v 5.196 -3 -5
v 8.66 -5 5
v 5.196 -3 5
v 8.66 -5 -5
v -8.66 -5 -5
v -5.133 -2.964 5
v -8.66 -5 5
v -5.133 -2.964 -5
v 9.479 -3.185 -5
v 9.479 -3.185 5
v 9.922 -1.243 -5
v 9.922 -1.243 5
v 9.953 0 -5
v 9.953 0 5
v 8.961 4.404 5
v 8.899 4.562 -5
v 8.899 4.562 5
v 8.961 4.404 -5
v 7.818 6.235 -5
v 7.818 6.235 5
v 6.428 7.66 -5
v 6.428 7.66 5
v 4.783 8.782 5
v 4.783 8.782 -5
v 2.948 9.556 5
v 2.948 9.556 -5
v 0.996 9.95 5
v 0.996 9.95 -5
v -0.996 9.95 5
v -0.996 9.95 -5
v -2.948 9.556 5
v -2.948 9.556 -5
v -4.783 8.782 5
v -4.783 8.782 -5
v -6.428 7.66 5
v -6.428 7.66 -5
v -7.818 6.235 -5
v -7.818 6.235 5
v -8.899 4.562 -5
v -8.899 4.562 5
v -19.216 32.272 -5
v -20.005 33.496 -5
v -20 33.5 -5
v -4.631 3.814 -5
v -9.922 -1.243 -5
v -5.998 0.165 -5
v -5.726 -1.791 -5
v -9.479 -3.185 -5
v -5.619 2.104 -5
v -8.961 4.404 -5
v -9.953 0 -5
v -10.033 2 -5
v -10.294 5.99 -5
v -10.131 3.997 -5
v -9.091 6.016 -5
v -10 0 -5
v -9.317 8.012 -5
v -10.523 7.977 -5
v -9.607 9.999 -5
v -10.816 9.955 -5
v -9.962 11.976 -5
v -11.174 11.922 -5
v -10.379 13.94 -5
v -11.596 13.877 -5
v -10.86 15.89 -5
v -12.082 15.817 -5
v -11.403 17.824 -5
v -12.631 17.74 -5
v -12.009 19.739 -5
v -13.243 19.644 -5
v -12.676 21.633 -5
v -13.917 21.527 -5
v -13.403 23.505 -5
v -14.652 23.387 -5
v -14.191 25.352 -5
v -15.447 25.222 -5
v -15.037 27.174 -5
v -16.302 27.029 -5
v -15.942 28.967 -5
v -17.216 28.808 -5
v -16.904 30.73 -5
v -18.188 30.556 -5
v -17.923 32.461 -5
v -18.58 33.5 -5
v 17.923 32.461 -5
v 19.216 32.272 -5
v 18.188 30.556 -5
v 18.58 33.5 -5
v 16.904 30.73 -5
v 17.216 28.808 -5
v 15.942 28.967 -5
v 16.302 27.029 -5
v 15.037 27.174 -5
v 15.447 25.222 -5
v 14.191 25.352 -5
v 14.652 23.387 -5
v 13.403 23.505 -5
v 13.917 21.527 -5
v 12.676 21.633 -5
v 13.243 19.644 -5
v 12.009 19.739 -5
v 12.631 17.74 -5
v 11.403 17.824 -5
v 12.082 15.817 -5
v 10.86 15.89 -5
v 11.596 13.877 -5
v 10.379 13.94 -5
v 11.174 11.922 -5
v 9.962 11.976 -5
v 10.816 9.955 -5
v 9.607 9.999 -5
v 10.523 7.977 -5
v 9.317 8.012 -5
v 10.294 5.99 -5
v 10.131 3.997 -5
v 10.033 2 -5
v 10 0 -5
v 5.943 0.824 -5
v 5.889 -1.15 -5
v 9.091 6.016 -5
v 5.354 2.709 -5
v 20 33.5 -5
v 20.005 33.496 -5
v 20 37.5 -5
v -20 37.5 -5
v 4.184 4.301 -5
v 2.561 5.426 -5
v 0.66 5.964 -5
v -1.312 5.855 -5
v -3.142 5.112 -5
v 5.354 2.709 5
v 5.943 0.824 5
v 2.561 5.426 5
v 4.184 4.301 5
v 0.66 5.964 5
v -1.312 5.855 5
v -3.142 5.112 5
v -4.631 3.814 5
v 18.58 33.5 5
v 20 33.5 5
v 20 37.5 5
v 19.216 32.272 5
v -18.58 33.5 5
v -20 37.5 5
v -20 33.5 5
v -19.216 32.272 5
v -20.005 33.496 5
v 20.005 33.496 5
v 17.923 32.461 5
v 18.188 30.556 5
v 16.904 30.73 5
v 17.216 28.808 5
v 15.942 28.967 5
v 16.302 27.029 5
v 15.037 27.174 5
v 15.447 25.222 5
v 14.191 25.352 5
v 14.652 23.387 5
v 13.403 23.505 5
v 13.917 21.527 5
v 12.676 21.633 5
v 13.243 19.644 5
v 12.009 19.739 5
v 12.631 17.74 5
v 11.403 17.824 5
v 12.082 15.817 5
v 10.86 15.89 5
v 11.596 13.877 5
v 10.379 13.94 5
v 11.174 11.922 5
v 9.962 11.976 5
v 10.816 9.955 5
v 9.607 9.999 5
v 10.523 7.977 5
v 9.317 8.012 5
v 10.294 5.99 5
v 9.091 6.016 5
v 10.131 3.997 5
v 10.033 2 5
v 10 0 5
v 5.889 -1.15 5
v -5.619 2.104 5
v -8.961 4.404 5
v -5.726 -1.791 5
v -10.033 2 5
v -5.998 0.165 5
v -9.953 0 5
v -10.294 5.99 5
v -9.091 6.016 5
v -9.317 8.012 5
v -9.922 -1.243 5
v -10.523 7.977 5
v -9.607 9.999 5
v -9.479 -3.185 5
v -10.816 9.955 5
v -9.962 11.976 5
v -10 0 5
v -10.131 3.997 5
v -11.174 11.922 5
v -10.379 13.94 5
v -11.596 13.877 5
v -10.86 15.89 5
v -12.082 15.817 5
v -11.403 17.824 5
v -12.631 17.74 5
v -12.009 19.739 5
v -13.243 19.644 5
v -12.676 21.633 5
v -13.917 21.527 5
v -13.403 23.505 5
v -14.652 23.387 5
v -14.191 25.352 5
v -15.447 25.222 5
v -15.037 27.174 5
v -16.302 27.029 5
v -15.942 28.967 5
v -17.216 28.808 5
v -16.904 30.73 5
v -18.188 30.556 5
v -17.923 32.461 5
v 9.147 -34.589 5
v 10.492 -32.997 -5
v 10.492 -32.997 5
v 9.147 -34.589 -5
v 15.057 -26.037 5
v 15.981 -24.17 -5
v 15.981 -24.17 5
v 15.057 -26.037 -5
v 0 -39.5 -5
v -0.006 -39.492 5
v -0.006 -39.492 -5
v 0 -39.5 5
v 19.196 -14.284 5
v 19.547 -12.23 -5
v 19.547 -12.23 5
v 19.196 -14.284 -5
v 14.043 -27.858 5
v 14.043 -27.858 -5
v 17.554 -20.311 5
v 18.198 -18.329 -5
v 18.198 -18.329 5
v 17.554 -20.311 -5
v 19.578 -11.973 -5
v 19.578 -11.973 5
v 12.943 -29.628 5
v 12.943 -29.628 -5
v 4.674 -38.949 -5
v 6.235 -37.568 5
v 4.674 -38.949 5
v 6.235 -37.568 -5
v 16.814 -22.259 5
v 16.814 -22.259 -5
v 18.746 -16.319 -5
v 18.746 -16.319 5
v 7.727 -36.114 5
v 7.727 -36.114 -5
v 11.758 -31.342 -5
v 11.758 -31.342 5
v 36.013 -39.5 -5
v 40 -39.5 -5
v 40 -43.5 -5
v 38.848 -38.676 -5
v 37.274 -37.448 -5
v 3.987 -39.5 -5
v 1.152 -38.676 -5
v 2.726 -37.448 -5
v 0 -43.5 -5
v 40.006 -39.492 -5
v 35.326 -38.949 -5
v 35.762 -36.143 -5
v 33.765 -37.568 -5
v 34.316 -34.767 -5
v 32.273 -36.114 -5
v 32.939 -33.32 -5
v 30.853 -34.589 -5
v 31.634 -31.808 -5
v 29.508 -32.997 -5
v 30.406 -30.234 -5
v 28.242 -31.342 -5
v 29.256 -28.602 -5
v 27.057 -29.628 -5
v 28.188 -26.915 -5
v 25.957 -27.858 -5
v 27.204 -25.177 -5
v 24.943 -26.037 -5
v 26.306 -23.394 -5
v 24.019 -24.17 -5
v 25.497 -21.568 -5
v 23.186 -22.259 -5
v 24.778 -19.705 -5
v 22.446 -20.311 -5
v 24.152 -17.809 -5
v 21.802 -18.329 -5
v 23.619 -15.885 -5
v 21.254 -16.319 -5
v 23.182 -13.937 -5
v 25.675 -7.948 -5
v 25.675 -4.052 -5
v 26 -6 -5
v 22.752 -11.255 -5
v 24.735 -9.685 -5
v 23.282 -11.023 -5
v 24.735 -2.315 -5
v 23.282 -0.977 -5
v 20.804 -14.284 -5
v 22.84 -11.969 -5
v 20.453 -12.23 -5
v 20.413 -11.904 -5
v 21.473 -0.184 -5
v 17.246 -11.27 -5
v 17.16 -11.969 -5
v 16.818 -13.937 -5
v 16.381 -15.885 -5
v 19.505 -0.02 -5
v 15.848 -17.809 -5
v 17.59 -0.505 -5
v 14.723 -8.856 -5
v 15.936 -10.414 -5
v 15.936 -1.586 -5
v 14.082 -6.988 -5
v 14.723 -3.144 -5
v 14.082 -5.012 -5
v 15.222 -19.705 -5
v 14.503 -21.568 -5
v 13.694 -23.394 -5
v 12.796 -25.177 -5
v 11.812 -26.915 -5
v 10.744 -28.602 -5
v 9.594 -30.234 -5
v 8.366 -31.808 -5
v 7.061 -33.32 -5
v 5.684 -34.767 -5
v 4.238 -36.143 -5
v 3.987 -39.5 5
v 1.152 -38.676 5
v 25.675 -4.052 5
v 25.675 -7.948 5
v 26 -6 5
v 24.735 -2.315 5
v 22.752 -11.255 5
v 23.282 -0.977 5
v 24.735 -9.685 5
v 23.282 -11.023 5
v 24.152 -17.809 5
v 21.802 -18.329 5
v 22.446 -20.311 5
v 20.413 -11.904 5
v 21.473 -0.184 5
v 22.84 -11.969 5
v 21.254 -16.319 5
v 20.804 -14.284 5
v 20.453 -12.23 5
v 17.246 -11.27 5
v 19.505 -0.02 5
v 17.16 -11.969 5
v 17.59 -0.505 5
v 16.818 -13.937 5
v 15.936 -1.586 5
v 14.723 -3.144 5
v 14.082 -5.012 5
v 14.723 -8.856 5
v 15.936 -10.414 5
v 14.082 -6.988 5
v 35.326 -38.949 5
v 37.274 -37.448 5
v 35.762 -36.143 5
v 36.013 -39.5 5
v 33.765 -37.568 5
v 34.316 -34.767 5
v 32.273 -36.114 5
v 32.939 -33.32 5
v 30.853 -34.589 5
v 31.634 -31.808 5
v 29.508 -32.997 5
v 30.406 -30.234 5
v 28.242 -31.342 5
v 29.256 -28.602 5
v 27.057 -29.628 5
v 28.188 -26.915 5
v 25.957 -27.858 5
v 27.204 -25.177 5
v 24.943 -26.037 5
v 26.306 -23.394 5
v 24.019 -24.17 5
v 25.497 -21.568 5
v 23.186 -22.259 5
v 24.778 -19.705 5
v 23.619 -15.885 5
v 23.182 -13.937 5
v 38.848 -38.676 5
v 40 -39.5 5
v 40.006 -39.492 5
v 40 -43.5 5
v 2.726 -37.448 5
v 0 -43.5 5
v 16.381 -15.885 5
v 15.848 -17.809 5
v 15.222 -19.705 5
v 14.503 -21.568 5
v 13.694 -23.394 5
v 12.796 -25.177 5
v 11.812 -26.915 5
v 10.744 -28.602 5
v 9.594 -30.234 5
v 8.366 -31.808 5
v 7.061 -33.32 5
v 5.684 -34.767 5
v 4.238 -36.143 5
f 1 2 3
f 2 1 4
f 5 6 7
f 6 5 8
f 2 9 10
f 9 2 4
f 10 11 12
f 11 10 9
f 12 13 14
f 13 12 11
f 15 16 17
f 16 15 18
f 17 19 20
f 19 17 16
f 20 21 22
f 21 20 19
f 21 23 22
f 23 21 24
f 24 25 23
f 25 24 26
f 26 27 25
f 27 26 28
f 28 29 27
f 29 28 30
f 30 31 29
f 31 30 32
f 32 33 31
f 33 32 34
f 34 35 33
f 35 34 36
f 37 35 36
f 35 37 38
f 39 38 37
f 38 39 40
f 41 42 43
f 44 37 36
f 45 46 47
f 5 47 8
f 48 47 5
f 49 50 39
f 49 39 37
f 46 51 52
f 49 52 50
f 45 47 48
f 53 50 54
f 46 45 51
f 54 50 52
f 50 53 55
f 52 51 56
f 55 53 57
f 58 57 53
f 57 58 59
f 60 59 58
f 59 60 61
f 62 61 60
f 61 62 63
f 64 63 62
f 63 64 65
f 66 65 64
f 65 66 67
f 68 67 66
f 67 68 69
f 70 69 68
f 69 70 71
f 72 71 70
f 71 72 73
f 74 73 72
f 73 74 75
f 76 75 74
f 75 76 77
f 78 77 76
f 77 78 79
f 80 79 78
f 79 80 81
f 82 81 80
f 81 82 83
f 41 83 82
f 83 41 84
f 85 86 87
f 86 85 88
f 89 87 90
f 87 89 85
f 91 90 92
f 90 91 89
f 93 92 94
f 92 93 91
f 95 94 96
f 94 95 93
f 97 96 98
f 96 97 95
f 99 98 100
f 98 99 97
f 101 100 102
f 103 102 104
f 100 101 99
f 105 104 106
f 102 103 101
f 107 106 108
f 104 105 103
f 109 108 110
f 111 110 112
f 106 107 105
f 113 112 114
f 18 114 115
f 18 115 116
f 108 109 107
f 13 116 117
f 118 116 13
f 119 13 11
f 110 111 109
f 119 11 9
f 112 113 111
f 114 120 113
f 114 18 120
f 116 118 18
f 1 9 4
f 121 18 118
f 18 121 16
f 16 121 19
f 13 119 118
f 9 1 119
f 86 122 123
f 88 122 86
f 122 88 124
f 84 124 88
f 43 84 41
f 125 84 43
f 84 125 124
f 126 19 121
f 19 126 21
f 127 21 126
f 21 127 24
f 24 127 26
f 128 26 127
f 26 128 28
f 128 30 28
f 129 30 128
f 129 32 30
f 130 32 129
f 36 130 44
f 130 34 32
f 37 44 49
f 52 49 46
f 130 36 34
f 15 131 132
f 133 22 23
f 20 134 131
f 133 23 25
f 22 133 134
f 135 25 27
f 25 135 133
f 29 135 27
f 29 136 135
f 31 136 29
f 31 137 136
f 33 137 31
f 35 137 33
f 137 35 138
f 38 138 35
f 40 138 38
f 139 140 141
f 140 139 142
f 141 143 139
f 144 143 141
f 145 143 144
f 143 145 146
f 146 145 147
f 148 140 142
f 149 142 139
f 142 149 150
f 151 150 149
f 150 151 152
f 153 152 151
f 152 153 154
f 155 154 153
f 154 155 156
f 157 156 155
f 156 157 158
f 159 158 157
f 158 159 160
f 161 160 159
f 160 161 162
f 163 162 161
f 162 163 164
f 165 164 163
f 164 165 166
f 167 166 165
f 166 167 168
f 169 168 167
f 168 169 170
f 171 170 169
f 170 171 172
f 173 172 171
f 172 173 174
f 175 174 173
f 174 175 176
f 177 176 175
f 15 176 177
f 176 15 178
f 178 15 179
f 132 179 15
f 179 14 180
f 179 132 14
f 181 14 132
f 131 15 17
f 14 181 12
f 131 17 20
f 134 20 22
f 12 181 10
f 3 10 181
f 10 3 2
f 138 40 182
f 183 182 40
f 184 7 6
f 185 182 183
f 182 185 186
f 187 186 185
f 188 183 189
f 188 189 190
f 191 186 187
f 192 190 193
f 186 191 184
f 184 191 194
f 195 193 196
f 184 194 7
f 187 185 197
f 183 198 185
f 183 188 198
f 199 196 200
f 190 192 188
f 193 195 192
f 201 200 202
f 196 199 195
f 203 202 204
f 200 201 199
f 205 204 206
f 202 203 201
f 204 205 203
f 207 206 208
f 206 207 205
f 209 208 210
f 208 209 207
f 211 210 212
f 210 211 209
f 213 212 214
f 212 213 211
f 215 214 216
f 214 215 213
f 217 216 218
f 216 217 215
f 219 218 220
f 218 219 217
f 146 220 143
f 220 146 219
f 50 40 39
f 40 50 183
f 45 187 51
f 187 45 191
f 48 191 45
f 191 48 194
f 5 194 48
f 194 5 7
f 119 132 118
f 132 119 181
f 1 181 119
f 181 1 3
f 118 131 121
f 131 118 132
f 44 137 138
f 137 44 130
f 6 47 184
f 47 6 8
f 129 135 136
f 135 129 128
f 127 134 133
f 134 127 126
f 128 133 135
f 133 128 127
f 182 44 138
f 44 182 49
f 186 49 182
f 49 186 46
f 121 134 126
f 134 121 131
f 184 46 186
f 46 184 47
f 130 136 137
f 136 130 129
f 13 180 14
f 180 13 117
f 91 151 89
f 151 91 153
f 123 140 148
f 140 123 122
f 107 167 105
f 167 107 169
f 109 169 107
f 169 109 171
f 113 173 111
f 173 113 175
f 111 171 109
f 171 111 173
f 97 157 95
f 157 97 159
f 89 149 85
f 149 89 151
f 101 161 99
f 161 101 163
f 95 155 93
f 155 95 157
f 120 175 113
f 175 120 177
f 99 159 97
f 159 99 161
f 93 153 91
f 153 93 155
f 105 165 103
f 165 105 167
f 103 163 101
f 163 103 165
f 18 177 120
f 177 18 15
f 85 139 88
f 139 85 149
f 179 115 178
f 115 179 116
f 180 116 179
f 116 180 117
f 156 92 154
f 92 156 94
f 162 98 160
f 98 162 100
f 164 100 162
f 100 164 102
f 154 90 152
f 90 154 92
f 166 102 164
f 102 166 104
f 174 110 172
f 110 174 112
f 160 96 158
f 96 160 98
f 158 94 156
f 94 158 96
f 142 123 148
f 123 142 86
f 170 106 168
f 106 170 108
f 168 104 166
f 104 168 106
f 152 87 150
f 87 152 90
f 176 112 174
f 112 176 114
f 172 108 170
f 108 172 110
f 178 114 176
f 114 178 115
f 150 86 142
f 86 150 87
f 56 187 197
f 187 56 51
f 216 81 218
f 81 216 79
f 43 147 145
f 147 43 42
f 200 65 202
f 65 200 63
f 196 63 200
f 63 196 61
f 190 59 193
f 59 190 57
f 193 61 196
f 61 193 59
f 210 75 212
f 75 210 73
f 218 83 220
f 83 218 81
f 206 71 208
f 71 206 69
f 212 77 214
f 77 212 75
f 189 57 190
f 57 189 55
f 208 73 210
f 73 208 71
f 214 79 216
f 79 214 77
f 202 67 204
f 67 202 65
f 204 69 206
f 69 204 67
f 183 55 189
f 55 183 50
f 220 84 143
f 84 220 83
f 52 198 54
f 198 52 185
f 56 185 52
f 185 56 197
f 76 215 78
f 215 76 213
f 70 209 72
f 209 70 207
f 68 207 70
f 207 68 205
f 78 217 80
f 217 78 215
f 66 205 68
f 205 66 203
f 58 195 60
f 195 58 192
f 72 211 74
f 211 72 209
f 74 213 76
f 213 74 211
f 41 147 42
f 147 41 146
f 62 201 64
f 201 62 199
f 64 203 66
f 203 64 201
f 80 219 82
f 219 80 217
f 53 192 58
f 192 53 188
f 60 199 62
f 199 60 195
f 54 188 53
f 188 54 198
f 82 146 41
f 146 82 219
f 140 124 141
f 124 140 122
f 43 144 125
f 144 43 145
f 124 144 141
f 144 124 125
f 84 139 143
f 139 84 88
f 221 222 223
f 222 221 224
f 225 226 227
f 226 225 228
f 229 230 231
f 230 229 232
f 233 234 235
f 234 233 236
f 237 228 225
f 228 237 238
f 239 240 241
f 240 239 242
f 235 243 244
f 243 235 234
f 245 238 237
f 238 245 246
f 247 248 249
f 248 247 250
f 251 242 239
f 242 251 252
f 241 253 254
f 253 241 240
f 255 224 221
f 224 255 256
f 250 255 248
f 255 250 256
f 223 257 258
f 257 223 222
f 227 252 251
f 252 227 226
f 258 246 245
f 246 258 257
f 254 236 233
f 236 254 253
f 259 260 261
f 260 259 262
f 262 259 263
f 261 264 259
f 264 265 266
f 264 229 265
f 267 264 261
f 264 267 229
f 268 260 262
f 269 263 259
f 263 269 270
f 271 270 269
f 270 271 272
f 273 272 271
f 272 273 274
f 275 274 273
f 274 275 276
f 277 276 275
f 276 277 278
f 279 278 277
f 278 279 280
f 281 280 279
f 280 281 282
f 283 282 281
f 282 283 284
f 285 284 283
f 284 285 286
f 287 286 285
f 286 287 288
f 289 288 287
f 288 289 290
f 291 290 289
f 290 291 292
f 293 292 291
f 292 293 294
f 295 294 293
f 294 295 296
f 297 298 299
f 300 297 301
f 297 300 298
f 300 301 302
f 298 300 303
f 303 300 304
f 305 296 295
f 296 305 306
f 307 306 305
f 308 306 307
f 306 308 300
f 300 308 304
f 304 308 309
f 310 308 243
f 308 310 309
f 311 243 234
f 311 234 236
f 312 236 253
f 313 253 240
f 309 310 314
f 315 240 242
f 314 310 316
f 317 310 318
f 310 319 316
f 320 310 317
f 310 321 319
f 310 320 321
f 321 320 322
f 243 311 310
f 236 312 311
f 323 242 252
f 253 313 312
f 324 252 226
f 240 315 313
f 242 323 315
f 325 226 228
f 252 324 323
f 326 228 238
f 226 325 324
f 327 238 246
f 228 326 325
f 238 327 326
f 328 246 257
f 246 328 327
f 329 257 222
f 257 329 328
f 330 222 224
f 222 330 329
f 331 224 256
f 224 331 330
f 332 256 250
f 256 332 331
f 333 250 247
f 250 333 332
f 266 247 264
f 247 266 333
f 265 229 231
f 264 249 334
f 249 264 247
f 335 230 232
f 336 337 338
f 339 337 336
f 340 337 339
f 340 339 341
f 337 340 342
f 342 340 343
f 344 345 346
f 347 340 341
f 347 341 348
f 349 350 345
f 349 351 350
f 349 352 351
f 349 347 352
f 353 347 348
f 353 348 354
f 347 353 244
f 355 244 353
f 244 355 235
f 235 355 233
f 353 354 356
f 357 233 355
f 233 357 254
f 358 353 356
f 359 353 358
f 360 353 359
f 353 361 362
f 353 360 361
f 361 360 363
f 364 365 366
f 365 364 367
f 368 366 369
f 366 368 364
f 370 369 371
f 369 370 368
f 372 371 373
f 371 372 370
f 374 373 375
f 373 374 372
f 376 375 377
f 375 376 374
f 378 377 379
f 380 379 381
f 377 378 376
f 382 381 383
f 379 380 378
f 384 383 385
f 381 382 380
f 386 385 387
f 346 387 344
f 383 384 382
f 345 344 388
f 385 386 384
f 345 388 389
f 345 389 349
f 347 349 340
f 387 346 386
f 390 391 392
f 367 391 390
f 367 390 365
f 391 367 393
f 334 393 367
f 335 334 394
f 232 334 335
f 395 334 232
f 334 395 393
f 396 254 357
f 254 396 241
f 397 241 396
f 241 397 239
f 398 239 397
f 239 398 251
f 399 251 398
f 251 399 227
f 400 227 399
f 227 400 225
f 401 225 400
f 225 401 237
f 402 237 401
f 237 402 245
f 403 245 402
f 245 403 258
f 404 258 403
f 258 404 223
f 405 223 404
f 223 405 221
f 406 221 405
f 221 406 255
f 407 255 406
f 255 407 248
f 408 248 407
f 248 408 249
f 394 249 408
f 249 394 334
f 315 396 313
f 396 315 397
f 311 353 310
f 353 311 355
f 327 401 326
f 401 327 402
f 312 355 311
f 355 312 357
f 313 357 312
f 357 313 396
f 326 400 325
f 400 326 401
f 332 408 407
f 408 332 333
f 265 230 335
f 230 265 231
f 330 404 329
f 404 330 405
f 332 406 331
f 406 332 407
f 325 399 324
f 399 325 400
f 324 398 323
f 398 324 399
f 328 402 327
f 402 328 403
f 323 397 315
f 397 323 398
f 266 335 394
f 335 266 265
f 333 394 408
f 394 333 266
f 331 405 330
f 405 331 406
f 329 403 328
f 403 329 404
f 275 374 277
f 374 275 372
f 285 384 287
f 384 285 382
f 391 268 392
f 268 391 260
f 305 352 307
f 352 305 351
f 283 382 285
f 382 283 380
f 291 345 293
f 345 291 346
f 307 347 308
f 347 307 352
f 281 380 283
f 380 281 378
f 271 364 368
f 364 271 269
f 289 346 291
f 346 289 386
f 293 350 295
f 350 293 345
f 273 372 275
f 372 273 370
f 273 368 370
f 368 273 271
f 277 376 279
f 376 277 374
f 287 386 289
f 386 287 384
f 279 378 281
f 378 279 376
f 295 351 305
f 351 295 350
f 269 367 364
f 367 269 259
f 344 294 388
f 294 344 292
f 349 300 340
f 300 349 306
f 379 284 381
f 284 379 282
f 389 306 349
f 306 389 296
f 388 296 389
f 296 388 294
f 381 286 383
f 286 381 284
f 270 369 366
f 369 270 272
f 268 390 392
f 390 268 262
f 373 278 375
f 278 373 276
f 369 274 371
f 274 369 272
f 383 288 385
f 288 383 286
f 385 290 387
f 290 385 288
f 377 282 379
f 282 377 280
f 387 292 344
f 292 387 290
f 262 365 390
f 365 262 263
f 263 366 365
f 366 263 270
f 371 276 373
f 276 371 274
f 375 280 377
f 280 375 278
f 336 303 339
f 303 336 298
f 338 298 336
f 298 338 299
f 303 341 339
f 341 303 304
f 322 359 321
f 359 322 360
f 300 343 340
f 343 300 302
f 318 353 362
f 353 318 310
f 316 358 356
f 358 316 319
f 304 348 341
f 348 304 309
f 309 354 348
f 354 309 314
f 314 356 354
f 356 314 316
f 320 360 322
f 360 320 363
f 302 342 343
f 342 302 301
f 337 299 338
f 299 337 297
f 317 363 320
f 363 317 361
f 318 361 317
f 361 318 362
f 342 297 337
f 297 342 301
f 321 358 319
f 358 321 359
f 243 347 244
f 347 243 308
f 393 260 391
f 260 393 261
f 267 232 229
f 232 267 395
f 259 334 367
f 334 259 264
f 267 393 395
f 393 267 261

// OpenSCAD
/* [General] */
//radius of the center cylinder that gets captured
circle_rad = 6;
//outer radius of the grabber
outer_rad = 10;
//how high to "extrude" evertyhing
height = 10;
//Desired total length of both parts when captured
total_len = 75;


/* [Grabber portion] */
//Base width
grabber_base_w = 40;
//Base depth (thickness)
grabber_base_d = 4;
//Arms depth (thickness)
grabber_arm_d = 1.2;
//Set the length of the grabber (circle center to end of base) instead of assuming half of total_len
grabber_len_override = -1;
grabber_arm_len = (grabber_len_override>0) ? grabber_len_override : total_len/2 - grabber_base_d;
//Radial gap between captured cylinder and grabber; 0 is probably best for most cases
grabber_gap = 0.0; //[0:0.1:5]
//Angle (degrees) of the open gap in the grabber that accepts the captured cylinder; smaller is tighter
grabber_open_angle = 120;


/* [Captured portion] */
//Base width
captured_base_w = 40;
//Base depth (thickness)
captured_base_d = 4;
//Arms depth (thickness)
captured_arm_d = 2.4;
//Set the length of the captured part (cylinder center to end of base) instead of assuming half of total_len
captured_len_override = -1;
captured_arm_len = (captured_len_override>0) ? captured_len_override : total_len/2 - captured_base_d;


/* [Render] */
//Set to false to render in the catpured orientation to see how they will fit
printable = true;


module blank() {
    //this just stops customizer variable parsing
}

e = 0.01;
$fa = 1;


//make stuff
if (printable) {
    grabber();
    translate([(outer_rad+circle_rad)+4, -circle_rad, 0]) captured();
} else {
    grabber();
    captured();
}


// Modules

module grabber() {
    grabber_hook();
    grabber_arms();
    //color([1, 0.5, 0, 0.5])
        grabber_base();
}

module grabber_hook() {
    
    ir = circle_rad+grabber_gap;
    or = outer_rad;
    //a = 240;
    a = 360-grabber_open_angle;
    
    cylinderSection(ir, or, height, a);
}

module grabber_base() {
    translate([0, grabber_base_d/2 + grabber_arm_len, 0])
        cube(size=[grabber_base_w, grabber_base_d, height], center=true);
}

module grabber_arms() {
    //gotta do a bunch of complicated triangle and circle chord math;
    //start by finding the straight-line distance between outer radius and end of base
    a = grabber_base_w/2 - outer_rad;
    b = grabber_arm_len;
    hyp = sqrt((a*a + b*b));
    
    //Calculate the acute angle between the long side and the hypotenuse; this is the tangent angle of the target arc relative to the hypotenuse.
    longSide = max(a, b);
    alpha = acos(longSide / hyp); //accute angle
    
    //calculate the angle between the hypotenuse and the line perpendicular to the long side; the perpendicular line will be the radius of the target arc
    aPrime = 90-alpha;
    
    //The line perpendicular to the hypotenuse (centered on its length) and perpendicular to the long side (at alpha) form a right triange
    //The hypteneus length of this triangle is the radius of the largest circle that will intersect both ends of the first hypotenuse without exceeding the long or short sides of the first triangle.
    rad = (hyp/2)/cos(aPrime);
    
    //calc the angle of the arc segment relative to the center point of its circle, based on the radius
    angle = 2*asin(hyp/(2*rad));
    
    if (b<a) { //wider than long; start parallel to base instead of Y axis
        mirror([1, 1, 0])
            translate([-rad-grabber_arm_len, -grabber_base_w/2, 0])
                gra(a, rad, angle);
        
                mirror([1, 1, 0])
                    rotate([0, 0, 180])
                        translate([rad+grabber_arm_len, -grabber_base_w/2, 0])
                            gla(a, rad, angle);
        
    } else { //longer than wide, most common
        gra(a, rad, angle);
        gla(a, rad, angle);
    }
}

module gra(a, rad, angle) {
    translate([rad+a, 0, 0])
        mirror([1, 0, 0])
            cylinderSection(rad, rad+grabber_arm_d, height, angle, false);
}

module gla(a, rad, angle) {
    translate([-rad-a, 0, 0])
            cylinderSection(rad, rad+grabber_arm_d, height, angle, false);
}



module captured() {
    captured_cyl();
    captured_arms();
    //color([1, 0.5, 0, 0.5])
        captured_base();
}

module captured_cyl() {
    cylinder(r=circle_rad, h=height, center=true);
}

module captured_base() {
    translate([0, -captured_base_d/2 - captured_arm_len, 0])
        cube(size=[captured_base_w, captured_base_d, height], center=true);
}

module captured_arms(right=true) {
    // Same math as in grabber_arms(), see comments there.
    a = captured_base_w/2 - captured_arm_d;
    b = captured_arm_len;
    hyp = sqrt((a*a + b*b));
    
    longSide = max(a, b);
    alpha = acos(longSide / hyp); //accute angle
    
    aPrime = 90-alpha;
    rad = (hyp/2)/cos(aPrime);
    angle = 2*asin(hyp/(2*rad));
    
    if (b<a) {
        //they don't quite meet at the origin (not sure why they should), but close enough for practical purposes
        translate([-captured_base_w/2, -captured_arm_len-captured_arm_d, 0])
            rotate([0, 0, -90])
                mirror([0, 1, 0])
                    cra(rad, angle);
        
        translate([captured_base_w/2, -captured_arm_len-captured_arm_d, 0])
            rotate([0, 0, 90])
                mirror([0, 1, 0])
                    cla(rad, angle);
        
    } else {
        cra(rad, angle);
        cla(rad, angle);
    }
}

//captured right arm, when arm length is longer than half the base width
module cra(rad, angle) {
    translate([-rad-captured_arm_d, 0, 0])
        mirror([0, 1, 0])
            cylinderSection(rad, rad+captured_arm_d, height, angle, false);
}

//captured left arm, when arm length is longer than half the base width
module cla(rad, angle) {
    mirror([1, 0, 0]) mirror([0, 1, 0])
        translate([-rad-captured_arm_d, 0, 0])
            cylinderSection(rad, rad+captured_arm_d, height, angle, false);
}



module cylinderSection(ir, or, h, a, sym=true) {
    if (sym) { //align to Y axis symmetry
        rotate([0, 0, -(a-180)/2]) cS(ir, or, h, a);
    } else {
        cS(ir, or, h, a);
    }
    
}

//Used by cylinderSection
module cS(ir, or, h, a) {
    ex = 0.01;
    difference() {
        translate([0, 0, -h/2]) //simulate center=true
            rotate_extrude(angle=a) square([or, h]);
        cylinder(r=ir, h=h+ex, center=true);
    }
}
